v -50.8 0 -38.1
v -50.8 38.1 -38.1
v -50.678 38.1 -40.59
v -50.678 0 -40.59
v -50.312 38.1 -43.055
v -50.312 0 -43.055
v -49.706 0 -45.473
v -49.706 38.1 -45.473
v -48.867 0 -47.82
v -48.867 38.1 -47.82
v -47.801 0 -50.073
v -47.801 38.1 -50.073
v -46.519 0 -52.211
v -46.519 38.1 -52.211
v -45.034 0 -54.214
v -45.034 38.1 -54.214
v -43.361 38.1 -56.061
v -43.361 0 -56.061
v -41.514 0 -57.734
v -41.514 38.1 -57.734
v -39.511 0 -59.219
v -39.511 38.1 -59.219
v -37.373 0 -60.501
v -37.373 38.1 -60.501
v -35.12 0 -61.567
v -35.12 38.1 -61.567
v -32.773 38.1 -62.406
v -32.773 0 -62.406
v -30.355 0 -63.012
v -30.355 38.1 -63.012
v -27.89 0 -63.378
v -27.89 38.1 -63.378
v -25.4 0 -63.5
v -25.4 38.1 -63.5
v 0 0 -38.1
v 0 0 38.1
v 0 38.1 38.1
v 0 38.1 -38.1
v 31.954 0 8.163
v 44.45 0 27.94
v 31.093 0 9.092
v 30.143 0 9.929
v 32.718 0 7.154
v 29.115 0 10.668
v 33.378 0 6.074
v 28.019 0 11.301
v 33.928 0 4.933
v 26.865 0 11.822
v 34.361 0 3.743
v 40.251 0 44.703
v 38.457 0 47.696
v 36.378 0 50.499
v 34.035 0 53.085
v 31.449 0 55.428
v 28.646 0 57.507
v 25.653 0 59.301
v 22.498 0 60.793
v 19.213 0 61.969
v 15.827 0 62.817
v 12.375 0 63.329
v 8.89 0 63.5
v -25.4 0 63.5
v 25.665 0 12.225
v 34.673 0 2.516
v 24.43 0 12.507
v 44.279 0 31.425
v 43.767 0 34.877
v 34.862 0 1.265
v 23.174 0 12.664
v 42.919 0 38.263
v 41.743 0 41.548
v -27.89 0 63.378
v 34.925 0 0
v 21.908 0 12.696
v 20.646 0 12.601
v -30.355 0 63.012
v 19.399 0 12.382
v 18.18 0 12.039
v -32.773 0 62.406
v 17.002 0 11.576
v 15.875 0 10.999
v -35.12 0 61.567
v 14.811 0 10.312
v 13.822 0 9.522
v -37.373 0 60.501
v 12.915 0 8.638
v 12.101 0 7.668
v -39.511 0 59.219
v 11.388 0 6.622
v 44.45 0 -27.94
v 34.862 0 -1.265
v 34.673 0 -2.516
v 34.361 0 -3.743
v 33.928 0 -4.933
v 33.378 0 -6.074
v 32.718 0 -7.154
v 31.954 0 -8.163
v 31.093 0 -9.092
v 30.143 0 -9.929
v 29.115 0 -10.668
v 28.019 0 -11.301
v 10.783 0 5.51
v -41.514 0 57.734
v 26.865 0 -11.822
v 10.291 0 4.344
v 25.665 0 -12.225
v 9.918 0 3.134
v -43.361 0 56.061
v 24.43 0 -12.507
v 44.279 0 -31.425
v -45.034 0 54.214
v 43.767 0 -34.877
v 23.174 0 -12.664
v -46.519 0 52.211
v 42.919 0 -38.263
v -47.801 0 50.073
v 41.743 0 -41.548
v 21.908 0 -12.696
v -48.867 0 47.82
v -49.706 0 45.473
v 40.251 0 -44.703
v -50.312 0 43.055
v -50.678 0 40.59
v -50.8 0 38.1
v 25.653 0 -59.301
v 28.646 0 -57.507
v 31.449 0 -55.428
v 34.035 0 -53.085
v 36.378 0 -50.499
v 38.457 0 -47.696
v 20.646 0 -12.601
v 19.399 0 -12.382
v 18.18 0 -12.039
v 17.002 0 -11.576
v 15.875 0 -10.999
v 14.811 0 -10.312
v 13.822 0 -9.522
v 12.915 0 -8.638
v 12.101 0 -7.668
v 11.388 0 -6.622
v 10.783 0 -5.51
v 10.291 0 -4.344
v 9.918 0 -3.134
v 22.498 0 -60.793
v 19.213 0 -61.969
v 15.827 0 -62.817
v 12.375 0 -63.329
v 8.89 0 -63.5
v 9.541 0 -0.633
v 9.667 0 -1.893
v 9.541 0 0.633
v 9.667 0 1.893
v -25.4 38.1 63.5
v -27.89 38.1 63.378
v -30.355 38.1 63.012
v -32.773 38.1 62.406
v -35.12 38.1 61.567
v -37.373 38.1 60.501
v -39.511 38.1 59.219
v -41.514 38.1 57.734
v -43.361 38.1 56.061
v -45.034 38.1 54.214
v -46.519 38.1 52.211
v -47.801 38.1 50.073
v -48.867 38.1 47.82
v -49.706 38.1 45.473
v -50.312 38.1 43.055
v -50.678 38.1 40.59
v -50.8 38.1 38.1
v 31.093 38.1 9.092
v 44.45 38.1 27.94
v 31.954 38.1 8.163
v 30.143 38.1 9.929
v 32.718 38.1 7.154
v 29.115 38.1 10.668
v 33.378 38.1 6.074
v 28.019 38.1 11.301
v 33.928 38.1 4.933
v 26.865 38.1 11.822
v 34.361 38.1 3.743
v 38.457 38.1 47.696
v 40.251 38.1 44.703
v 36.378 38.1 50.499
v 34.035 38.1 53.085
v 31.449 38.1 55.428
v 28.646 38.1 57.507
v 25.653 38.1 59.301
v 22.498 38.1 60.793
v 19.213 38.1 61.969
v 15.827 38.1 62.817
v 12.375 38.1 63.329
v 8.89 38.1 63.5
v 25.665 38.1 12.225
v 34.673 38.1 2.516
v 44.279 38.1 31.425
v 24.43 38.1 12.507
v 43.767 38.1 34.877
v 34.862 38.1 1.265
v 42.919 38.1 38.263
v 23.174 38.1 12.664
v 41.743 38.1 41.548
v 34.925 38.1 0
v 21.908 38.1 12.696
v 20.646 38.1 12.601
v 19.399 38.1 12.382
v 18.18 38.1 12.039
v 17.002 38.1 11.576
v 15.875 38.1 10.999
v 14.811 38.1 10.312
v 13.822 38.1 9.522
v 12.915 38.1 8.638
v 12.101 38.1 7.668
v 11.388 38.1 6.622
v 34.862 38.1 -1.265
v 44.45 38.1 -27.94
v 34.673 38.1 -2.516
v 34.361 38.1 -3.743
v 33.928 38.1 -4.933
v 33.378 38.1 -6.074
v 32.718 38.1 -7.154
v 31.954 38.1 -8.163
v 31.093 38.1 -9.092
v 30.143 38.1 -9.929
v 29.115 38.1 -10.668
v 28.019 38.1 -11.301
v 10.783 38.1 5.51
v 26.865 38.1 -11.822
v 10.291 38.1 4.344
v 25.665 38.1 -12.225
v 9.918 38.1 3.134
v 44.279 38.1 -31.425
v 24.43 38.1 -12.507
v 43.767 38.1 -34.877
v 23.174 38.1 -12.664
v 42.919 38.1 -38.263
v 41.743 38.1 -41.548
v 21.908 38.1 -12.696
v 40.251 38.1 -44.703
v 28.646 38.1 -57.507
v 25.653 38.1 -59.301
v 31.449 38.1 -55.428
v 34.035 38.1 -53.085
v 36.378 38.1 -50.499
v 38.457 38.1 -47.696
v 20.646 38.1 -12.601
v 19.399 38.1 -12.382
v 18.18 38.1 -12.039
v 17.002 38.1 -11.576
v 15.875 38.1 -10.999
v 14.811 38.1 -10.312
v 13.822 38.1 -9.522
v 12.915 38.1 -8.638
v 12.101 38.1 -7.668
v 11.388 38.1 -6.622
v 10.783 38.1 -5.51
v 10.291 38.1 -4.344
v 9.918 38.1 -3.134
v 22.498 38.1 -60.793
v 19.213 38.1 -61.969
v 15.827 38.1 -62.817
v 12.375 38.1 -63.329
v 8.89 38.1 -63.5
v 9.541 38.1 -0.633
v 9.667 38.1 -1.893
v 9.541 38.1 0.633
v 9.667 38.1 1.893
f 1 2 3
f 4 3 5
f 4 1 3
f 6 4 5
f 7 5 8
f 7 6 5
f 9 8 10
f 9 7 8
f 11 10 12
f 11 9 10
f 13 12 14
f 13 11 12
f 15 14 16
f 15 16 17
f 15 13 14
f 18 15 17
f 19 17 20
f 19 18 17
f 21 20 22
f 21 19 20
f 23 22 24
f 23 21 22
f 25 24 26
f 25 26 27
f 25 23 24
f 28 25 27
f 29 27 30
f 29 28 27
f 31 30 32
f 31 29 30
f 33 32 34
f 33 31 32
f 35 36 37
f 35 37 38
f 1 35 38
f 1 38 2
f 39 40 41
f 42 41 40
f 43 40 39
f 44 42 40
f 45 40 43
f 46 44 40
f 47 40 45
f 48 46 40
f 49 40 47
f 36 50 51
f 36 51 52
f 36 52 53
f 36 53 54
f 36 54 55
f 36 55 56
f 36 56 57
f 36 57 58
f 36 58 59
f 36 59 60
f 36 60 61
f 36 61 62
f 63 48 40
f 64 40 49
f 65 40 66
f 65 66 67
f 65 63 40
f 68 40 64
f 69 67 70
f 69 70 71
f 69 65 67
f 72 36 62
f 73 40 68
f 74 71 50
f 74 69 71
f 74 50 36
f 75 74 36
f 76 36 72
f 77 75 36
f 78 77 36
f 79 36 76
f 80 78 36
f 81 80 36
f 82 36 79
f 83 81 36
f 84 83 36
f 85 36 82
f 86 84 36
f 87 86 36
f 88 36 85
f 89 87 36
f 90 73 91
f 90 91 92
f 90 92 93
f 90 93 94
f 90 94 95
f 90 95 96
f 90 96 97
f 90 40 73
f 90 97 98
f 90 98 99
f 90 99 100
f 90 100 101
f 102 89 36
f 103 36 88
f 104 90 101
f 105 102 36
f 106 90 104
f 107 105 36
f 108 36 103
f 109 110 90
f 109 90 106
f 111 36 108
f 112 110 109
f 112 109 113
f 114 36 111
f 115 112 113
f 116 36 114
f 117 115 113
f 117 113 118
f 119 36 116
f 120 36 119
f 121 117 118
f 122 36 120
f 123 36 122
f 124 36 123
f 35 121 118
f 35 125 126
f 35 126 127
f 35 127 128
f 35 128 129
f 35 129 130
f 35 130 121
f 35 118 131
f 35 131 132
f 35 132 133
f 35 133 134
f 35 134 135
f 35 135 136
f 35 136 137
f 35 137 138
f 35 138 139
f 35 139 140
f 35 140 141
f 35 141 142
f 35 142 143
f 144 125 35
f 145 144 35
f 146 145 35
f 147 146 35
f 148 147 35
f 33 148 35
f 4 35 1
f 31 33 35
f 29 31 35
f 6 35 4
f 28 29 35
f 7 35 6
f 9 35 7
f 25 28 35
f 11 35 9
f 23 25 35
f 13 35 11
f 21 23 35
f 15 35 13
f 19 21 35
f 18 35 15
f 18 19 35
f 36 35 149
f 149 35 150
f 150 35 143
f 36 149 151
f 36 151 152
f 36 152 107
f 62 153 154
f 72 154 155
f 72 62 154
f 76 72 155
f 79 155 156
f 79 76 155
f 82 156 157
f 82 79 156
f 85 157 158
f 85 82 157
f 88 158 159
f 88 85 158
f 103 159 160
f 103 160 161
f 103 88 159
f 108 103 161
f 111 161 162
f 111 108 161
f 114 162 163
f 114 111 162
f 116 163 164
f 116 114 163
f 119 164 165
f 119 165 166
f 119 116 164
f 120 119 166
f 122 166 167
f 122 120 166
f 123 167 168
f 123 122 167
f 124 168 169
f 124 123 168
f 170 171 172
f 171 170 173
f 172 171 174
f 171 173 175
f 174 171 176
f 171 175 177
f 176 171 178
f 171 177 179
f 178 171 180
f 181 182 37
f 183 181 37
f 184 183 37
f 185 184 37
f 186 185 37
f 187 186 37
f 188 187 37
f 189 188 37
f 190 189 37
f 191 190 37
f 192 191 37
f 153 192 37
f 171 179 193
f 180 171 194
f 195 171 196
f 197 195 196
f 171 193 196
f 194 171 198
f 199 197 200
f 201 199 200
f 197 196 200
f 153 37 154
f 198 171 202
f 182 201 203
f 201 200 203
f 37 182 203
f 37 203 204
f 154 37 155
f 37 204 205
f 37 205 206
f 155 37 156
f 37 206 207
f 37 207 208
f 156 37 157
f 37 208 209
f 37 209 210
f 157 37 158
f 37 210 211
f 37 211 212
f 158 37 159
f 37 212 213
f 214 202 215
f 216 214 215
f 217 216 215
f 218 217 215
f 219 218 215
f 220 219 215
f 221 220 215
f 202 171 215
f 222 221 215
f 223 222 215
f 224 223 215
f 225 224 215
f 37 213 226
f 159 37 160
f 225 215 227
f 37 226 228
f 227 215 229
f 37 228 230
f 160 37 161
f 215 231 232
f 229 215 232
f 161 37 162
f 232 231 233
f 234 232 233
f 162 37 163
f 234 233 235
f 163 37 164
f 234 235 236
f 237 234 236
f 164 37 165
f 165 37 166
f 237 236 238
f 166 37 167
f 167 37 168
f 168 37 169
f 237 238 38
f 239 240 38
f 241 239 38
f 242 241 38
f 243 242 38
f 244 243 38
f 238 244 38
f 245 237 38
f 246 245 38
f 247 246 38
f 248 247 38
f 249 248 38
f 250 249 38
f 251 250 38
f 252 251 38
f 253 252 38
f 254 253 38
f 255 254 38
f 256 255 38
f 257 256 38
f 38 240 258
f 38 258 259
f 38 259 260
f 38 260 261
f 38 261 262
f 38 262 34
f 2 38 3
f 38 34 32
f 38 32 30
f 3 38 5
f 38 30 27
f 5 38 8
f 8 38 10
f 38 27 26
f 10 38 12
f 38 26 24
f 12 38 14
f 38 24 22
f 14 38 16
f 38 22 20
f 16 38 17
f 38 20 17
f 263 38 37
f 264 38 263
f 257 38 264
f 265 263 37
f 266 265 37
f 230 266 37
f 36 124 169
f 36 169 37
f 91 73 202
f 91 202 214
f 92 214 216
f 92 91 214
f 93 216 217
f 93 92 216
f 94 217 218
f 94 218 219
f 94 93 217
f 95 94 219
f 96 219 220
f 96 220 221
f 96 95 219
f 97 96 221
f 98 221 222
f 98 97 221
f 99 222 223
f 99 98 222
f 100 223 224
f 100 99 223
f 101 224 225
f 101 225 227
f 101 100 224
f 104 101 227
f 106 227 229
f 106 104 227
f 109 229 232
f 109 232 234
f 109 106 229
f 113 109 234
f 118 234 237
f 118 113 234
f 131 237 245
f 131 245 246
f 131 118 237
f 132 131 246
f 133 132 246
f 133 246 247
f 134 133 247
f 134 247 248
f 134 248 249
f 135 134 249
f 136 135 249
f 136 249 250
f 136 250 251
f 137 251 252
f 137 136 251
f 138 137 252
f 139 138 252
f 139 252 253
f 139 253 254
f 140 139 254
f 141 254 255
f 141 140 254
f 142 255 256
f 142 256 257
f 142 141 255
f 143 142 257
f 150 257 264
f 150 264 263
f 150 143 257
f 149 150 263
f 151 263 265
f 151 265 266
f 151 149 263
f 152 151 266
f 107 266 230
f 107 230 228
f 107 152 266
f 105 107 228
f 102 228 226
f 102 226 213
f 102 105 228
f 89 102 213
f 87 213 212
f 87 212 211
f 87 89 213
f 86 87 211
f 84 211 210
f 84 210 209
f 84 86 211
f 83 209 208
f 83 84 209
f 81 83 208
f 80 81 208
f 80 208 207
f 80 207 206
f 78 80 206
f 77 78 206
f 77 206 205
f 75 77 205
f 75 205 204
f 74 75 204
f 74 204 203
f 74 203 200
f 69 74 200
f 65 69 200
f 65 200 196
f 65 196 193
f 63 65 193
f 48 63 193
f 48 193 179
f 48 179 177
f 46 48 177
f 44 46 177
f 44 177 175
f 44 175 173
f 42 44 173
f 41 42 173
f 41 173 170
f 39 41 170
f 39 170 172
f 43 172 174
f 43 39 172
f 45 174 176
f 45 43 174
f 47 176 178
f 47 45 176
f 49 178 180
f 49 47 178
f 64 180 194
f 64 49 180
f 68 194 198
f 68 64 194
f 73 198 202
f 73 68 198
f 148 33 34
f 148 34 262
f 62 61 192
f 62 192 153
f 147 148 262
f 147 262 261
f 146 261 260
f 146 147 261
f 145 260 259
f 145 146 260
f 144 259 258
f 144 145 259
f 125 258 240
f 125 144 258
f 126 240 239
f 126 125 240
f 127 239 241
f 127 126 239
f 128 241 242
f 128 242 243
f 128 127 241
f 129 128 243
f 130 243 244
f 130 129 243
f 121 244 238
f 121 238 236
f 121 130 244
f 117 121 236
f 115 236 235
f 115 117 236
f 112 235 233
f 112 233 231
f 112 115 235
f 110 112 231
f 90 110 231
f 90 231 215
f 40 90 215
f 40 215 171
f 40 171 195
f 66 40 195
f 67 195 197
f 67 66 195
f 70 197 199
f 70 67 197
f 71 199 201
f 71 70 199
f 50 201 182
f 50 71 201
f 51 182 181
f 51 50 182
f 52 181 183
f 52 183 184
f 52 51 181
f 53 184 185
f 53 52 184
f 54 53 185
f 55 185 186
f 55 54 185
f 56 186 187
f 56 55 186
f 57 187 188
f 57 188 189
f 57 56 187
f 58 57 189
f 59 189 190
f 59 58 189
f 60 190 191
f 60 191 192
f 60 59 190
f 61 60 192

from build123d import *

# Parameters (mm, degrees)
SKETCH2_R           = 12.7
BOSS_EXTRUDE1_DEPTH = 38.1


with BuildPart() as part:
    # Sketch2 → Boss-Extrude1 (new body)
    with BuildSketch(Plane(origin=(0, 0, 0), x_dir=(1, 0, 0), z_dir=(0, 1, 0))):
        with BuildLine():
            Line((0, -38.1), (0, 38.1))
            Line((0, 38.1), (-50.8, 38.1))
            ThreePointArc((-50.8, 38.1), (-43.360512242, 56.060512242), (-25.4, 63.5))
            Line((-25.4, 63.5), (8.89, 63.5))
            ThreePointArc((8.89, 63.5), (34.034717139, 53.084717139), (44.45, 27.94))
            Line((44.45, 27.94), (44.45, -27.94))
            ThreePointArc((44.45, -27.94), (34.034717139, -53.084717139), (8.89, -63.5))
            Line((8.89, -63.5), (-25.4, -63.5))
            ThreePointArc((-25.4, -63.5), (-43.360512242, -56.060512242), (-50.8, -38.1))
            Line((-50.8, -38.1), (0, -38.1))
        make_face()
        with Locations((22.225, 0)):
            Circle(SKETCH2_R, mode=Mode.SUBTRACT)
    extrude(amount=BOSS_EXTRUDE1_DEPTH)


solid = part.part
